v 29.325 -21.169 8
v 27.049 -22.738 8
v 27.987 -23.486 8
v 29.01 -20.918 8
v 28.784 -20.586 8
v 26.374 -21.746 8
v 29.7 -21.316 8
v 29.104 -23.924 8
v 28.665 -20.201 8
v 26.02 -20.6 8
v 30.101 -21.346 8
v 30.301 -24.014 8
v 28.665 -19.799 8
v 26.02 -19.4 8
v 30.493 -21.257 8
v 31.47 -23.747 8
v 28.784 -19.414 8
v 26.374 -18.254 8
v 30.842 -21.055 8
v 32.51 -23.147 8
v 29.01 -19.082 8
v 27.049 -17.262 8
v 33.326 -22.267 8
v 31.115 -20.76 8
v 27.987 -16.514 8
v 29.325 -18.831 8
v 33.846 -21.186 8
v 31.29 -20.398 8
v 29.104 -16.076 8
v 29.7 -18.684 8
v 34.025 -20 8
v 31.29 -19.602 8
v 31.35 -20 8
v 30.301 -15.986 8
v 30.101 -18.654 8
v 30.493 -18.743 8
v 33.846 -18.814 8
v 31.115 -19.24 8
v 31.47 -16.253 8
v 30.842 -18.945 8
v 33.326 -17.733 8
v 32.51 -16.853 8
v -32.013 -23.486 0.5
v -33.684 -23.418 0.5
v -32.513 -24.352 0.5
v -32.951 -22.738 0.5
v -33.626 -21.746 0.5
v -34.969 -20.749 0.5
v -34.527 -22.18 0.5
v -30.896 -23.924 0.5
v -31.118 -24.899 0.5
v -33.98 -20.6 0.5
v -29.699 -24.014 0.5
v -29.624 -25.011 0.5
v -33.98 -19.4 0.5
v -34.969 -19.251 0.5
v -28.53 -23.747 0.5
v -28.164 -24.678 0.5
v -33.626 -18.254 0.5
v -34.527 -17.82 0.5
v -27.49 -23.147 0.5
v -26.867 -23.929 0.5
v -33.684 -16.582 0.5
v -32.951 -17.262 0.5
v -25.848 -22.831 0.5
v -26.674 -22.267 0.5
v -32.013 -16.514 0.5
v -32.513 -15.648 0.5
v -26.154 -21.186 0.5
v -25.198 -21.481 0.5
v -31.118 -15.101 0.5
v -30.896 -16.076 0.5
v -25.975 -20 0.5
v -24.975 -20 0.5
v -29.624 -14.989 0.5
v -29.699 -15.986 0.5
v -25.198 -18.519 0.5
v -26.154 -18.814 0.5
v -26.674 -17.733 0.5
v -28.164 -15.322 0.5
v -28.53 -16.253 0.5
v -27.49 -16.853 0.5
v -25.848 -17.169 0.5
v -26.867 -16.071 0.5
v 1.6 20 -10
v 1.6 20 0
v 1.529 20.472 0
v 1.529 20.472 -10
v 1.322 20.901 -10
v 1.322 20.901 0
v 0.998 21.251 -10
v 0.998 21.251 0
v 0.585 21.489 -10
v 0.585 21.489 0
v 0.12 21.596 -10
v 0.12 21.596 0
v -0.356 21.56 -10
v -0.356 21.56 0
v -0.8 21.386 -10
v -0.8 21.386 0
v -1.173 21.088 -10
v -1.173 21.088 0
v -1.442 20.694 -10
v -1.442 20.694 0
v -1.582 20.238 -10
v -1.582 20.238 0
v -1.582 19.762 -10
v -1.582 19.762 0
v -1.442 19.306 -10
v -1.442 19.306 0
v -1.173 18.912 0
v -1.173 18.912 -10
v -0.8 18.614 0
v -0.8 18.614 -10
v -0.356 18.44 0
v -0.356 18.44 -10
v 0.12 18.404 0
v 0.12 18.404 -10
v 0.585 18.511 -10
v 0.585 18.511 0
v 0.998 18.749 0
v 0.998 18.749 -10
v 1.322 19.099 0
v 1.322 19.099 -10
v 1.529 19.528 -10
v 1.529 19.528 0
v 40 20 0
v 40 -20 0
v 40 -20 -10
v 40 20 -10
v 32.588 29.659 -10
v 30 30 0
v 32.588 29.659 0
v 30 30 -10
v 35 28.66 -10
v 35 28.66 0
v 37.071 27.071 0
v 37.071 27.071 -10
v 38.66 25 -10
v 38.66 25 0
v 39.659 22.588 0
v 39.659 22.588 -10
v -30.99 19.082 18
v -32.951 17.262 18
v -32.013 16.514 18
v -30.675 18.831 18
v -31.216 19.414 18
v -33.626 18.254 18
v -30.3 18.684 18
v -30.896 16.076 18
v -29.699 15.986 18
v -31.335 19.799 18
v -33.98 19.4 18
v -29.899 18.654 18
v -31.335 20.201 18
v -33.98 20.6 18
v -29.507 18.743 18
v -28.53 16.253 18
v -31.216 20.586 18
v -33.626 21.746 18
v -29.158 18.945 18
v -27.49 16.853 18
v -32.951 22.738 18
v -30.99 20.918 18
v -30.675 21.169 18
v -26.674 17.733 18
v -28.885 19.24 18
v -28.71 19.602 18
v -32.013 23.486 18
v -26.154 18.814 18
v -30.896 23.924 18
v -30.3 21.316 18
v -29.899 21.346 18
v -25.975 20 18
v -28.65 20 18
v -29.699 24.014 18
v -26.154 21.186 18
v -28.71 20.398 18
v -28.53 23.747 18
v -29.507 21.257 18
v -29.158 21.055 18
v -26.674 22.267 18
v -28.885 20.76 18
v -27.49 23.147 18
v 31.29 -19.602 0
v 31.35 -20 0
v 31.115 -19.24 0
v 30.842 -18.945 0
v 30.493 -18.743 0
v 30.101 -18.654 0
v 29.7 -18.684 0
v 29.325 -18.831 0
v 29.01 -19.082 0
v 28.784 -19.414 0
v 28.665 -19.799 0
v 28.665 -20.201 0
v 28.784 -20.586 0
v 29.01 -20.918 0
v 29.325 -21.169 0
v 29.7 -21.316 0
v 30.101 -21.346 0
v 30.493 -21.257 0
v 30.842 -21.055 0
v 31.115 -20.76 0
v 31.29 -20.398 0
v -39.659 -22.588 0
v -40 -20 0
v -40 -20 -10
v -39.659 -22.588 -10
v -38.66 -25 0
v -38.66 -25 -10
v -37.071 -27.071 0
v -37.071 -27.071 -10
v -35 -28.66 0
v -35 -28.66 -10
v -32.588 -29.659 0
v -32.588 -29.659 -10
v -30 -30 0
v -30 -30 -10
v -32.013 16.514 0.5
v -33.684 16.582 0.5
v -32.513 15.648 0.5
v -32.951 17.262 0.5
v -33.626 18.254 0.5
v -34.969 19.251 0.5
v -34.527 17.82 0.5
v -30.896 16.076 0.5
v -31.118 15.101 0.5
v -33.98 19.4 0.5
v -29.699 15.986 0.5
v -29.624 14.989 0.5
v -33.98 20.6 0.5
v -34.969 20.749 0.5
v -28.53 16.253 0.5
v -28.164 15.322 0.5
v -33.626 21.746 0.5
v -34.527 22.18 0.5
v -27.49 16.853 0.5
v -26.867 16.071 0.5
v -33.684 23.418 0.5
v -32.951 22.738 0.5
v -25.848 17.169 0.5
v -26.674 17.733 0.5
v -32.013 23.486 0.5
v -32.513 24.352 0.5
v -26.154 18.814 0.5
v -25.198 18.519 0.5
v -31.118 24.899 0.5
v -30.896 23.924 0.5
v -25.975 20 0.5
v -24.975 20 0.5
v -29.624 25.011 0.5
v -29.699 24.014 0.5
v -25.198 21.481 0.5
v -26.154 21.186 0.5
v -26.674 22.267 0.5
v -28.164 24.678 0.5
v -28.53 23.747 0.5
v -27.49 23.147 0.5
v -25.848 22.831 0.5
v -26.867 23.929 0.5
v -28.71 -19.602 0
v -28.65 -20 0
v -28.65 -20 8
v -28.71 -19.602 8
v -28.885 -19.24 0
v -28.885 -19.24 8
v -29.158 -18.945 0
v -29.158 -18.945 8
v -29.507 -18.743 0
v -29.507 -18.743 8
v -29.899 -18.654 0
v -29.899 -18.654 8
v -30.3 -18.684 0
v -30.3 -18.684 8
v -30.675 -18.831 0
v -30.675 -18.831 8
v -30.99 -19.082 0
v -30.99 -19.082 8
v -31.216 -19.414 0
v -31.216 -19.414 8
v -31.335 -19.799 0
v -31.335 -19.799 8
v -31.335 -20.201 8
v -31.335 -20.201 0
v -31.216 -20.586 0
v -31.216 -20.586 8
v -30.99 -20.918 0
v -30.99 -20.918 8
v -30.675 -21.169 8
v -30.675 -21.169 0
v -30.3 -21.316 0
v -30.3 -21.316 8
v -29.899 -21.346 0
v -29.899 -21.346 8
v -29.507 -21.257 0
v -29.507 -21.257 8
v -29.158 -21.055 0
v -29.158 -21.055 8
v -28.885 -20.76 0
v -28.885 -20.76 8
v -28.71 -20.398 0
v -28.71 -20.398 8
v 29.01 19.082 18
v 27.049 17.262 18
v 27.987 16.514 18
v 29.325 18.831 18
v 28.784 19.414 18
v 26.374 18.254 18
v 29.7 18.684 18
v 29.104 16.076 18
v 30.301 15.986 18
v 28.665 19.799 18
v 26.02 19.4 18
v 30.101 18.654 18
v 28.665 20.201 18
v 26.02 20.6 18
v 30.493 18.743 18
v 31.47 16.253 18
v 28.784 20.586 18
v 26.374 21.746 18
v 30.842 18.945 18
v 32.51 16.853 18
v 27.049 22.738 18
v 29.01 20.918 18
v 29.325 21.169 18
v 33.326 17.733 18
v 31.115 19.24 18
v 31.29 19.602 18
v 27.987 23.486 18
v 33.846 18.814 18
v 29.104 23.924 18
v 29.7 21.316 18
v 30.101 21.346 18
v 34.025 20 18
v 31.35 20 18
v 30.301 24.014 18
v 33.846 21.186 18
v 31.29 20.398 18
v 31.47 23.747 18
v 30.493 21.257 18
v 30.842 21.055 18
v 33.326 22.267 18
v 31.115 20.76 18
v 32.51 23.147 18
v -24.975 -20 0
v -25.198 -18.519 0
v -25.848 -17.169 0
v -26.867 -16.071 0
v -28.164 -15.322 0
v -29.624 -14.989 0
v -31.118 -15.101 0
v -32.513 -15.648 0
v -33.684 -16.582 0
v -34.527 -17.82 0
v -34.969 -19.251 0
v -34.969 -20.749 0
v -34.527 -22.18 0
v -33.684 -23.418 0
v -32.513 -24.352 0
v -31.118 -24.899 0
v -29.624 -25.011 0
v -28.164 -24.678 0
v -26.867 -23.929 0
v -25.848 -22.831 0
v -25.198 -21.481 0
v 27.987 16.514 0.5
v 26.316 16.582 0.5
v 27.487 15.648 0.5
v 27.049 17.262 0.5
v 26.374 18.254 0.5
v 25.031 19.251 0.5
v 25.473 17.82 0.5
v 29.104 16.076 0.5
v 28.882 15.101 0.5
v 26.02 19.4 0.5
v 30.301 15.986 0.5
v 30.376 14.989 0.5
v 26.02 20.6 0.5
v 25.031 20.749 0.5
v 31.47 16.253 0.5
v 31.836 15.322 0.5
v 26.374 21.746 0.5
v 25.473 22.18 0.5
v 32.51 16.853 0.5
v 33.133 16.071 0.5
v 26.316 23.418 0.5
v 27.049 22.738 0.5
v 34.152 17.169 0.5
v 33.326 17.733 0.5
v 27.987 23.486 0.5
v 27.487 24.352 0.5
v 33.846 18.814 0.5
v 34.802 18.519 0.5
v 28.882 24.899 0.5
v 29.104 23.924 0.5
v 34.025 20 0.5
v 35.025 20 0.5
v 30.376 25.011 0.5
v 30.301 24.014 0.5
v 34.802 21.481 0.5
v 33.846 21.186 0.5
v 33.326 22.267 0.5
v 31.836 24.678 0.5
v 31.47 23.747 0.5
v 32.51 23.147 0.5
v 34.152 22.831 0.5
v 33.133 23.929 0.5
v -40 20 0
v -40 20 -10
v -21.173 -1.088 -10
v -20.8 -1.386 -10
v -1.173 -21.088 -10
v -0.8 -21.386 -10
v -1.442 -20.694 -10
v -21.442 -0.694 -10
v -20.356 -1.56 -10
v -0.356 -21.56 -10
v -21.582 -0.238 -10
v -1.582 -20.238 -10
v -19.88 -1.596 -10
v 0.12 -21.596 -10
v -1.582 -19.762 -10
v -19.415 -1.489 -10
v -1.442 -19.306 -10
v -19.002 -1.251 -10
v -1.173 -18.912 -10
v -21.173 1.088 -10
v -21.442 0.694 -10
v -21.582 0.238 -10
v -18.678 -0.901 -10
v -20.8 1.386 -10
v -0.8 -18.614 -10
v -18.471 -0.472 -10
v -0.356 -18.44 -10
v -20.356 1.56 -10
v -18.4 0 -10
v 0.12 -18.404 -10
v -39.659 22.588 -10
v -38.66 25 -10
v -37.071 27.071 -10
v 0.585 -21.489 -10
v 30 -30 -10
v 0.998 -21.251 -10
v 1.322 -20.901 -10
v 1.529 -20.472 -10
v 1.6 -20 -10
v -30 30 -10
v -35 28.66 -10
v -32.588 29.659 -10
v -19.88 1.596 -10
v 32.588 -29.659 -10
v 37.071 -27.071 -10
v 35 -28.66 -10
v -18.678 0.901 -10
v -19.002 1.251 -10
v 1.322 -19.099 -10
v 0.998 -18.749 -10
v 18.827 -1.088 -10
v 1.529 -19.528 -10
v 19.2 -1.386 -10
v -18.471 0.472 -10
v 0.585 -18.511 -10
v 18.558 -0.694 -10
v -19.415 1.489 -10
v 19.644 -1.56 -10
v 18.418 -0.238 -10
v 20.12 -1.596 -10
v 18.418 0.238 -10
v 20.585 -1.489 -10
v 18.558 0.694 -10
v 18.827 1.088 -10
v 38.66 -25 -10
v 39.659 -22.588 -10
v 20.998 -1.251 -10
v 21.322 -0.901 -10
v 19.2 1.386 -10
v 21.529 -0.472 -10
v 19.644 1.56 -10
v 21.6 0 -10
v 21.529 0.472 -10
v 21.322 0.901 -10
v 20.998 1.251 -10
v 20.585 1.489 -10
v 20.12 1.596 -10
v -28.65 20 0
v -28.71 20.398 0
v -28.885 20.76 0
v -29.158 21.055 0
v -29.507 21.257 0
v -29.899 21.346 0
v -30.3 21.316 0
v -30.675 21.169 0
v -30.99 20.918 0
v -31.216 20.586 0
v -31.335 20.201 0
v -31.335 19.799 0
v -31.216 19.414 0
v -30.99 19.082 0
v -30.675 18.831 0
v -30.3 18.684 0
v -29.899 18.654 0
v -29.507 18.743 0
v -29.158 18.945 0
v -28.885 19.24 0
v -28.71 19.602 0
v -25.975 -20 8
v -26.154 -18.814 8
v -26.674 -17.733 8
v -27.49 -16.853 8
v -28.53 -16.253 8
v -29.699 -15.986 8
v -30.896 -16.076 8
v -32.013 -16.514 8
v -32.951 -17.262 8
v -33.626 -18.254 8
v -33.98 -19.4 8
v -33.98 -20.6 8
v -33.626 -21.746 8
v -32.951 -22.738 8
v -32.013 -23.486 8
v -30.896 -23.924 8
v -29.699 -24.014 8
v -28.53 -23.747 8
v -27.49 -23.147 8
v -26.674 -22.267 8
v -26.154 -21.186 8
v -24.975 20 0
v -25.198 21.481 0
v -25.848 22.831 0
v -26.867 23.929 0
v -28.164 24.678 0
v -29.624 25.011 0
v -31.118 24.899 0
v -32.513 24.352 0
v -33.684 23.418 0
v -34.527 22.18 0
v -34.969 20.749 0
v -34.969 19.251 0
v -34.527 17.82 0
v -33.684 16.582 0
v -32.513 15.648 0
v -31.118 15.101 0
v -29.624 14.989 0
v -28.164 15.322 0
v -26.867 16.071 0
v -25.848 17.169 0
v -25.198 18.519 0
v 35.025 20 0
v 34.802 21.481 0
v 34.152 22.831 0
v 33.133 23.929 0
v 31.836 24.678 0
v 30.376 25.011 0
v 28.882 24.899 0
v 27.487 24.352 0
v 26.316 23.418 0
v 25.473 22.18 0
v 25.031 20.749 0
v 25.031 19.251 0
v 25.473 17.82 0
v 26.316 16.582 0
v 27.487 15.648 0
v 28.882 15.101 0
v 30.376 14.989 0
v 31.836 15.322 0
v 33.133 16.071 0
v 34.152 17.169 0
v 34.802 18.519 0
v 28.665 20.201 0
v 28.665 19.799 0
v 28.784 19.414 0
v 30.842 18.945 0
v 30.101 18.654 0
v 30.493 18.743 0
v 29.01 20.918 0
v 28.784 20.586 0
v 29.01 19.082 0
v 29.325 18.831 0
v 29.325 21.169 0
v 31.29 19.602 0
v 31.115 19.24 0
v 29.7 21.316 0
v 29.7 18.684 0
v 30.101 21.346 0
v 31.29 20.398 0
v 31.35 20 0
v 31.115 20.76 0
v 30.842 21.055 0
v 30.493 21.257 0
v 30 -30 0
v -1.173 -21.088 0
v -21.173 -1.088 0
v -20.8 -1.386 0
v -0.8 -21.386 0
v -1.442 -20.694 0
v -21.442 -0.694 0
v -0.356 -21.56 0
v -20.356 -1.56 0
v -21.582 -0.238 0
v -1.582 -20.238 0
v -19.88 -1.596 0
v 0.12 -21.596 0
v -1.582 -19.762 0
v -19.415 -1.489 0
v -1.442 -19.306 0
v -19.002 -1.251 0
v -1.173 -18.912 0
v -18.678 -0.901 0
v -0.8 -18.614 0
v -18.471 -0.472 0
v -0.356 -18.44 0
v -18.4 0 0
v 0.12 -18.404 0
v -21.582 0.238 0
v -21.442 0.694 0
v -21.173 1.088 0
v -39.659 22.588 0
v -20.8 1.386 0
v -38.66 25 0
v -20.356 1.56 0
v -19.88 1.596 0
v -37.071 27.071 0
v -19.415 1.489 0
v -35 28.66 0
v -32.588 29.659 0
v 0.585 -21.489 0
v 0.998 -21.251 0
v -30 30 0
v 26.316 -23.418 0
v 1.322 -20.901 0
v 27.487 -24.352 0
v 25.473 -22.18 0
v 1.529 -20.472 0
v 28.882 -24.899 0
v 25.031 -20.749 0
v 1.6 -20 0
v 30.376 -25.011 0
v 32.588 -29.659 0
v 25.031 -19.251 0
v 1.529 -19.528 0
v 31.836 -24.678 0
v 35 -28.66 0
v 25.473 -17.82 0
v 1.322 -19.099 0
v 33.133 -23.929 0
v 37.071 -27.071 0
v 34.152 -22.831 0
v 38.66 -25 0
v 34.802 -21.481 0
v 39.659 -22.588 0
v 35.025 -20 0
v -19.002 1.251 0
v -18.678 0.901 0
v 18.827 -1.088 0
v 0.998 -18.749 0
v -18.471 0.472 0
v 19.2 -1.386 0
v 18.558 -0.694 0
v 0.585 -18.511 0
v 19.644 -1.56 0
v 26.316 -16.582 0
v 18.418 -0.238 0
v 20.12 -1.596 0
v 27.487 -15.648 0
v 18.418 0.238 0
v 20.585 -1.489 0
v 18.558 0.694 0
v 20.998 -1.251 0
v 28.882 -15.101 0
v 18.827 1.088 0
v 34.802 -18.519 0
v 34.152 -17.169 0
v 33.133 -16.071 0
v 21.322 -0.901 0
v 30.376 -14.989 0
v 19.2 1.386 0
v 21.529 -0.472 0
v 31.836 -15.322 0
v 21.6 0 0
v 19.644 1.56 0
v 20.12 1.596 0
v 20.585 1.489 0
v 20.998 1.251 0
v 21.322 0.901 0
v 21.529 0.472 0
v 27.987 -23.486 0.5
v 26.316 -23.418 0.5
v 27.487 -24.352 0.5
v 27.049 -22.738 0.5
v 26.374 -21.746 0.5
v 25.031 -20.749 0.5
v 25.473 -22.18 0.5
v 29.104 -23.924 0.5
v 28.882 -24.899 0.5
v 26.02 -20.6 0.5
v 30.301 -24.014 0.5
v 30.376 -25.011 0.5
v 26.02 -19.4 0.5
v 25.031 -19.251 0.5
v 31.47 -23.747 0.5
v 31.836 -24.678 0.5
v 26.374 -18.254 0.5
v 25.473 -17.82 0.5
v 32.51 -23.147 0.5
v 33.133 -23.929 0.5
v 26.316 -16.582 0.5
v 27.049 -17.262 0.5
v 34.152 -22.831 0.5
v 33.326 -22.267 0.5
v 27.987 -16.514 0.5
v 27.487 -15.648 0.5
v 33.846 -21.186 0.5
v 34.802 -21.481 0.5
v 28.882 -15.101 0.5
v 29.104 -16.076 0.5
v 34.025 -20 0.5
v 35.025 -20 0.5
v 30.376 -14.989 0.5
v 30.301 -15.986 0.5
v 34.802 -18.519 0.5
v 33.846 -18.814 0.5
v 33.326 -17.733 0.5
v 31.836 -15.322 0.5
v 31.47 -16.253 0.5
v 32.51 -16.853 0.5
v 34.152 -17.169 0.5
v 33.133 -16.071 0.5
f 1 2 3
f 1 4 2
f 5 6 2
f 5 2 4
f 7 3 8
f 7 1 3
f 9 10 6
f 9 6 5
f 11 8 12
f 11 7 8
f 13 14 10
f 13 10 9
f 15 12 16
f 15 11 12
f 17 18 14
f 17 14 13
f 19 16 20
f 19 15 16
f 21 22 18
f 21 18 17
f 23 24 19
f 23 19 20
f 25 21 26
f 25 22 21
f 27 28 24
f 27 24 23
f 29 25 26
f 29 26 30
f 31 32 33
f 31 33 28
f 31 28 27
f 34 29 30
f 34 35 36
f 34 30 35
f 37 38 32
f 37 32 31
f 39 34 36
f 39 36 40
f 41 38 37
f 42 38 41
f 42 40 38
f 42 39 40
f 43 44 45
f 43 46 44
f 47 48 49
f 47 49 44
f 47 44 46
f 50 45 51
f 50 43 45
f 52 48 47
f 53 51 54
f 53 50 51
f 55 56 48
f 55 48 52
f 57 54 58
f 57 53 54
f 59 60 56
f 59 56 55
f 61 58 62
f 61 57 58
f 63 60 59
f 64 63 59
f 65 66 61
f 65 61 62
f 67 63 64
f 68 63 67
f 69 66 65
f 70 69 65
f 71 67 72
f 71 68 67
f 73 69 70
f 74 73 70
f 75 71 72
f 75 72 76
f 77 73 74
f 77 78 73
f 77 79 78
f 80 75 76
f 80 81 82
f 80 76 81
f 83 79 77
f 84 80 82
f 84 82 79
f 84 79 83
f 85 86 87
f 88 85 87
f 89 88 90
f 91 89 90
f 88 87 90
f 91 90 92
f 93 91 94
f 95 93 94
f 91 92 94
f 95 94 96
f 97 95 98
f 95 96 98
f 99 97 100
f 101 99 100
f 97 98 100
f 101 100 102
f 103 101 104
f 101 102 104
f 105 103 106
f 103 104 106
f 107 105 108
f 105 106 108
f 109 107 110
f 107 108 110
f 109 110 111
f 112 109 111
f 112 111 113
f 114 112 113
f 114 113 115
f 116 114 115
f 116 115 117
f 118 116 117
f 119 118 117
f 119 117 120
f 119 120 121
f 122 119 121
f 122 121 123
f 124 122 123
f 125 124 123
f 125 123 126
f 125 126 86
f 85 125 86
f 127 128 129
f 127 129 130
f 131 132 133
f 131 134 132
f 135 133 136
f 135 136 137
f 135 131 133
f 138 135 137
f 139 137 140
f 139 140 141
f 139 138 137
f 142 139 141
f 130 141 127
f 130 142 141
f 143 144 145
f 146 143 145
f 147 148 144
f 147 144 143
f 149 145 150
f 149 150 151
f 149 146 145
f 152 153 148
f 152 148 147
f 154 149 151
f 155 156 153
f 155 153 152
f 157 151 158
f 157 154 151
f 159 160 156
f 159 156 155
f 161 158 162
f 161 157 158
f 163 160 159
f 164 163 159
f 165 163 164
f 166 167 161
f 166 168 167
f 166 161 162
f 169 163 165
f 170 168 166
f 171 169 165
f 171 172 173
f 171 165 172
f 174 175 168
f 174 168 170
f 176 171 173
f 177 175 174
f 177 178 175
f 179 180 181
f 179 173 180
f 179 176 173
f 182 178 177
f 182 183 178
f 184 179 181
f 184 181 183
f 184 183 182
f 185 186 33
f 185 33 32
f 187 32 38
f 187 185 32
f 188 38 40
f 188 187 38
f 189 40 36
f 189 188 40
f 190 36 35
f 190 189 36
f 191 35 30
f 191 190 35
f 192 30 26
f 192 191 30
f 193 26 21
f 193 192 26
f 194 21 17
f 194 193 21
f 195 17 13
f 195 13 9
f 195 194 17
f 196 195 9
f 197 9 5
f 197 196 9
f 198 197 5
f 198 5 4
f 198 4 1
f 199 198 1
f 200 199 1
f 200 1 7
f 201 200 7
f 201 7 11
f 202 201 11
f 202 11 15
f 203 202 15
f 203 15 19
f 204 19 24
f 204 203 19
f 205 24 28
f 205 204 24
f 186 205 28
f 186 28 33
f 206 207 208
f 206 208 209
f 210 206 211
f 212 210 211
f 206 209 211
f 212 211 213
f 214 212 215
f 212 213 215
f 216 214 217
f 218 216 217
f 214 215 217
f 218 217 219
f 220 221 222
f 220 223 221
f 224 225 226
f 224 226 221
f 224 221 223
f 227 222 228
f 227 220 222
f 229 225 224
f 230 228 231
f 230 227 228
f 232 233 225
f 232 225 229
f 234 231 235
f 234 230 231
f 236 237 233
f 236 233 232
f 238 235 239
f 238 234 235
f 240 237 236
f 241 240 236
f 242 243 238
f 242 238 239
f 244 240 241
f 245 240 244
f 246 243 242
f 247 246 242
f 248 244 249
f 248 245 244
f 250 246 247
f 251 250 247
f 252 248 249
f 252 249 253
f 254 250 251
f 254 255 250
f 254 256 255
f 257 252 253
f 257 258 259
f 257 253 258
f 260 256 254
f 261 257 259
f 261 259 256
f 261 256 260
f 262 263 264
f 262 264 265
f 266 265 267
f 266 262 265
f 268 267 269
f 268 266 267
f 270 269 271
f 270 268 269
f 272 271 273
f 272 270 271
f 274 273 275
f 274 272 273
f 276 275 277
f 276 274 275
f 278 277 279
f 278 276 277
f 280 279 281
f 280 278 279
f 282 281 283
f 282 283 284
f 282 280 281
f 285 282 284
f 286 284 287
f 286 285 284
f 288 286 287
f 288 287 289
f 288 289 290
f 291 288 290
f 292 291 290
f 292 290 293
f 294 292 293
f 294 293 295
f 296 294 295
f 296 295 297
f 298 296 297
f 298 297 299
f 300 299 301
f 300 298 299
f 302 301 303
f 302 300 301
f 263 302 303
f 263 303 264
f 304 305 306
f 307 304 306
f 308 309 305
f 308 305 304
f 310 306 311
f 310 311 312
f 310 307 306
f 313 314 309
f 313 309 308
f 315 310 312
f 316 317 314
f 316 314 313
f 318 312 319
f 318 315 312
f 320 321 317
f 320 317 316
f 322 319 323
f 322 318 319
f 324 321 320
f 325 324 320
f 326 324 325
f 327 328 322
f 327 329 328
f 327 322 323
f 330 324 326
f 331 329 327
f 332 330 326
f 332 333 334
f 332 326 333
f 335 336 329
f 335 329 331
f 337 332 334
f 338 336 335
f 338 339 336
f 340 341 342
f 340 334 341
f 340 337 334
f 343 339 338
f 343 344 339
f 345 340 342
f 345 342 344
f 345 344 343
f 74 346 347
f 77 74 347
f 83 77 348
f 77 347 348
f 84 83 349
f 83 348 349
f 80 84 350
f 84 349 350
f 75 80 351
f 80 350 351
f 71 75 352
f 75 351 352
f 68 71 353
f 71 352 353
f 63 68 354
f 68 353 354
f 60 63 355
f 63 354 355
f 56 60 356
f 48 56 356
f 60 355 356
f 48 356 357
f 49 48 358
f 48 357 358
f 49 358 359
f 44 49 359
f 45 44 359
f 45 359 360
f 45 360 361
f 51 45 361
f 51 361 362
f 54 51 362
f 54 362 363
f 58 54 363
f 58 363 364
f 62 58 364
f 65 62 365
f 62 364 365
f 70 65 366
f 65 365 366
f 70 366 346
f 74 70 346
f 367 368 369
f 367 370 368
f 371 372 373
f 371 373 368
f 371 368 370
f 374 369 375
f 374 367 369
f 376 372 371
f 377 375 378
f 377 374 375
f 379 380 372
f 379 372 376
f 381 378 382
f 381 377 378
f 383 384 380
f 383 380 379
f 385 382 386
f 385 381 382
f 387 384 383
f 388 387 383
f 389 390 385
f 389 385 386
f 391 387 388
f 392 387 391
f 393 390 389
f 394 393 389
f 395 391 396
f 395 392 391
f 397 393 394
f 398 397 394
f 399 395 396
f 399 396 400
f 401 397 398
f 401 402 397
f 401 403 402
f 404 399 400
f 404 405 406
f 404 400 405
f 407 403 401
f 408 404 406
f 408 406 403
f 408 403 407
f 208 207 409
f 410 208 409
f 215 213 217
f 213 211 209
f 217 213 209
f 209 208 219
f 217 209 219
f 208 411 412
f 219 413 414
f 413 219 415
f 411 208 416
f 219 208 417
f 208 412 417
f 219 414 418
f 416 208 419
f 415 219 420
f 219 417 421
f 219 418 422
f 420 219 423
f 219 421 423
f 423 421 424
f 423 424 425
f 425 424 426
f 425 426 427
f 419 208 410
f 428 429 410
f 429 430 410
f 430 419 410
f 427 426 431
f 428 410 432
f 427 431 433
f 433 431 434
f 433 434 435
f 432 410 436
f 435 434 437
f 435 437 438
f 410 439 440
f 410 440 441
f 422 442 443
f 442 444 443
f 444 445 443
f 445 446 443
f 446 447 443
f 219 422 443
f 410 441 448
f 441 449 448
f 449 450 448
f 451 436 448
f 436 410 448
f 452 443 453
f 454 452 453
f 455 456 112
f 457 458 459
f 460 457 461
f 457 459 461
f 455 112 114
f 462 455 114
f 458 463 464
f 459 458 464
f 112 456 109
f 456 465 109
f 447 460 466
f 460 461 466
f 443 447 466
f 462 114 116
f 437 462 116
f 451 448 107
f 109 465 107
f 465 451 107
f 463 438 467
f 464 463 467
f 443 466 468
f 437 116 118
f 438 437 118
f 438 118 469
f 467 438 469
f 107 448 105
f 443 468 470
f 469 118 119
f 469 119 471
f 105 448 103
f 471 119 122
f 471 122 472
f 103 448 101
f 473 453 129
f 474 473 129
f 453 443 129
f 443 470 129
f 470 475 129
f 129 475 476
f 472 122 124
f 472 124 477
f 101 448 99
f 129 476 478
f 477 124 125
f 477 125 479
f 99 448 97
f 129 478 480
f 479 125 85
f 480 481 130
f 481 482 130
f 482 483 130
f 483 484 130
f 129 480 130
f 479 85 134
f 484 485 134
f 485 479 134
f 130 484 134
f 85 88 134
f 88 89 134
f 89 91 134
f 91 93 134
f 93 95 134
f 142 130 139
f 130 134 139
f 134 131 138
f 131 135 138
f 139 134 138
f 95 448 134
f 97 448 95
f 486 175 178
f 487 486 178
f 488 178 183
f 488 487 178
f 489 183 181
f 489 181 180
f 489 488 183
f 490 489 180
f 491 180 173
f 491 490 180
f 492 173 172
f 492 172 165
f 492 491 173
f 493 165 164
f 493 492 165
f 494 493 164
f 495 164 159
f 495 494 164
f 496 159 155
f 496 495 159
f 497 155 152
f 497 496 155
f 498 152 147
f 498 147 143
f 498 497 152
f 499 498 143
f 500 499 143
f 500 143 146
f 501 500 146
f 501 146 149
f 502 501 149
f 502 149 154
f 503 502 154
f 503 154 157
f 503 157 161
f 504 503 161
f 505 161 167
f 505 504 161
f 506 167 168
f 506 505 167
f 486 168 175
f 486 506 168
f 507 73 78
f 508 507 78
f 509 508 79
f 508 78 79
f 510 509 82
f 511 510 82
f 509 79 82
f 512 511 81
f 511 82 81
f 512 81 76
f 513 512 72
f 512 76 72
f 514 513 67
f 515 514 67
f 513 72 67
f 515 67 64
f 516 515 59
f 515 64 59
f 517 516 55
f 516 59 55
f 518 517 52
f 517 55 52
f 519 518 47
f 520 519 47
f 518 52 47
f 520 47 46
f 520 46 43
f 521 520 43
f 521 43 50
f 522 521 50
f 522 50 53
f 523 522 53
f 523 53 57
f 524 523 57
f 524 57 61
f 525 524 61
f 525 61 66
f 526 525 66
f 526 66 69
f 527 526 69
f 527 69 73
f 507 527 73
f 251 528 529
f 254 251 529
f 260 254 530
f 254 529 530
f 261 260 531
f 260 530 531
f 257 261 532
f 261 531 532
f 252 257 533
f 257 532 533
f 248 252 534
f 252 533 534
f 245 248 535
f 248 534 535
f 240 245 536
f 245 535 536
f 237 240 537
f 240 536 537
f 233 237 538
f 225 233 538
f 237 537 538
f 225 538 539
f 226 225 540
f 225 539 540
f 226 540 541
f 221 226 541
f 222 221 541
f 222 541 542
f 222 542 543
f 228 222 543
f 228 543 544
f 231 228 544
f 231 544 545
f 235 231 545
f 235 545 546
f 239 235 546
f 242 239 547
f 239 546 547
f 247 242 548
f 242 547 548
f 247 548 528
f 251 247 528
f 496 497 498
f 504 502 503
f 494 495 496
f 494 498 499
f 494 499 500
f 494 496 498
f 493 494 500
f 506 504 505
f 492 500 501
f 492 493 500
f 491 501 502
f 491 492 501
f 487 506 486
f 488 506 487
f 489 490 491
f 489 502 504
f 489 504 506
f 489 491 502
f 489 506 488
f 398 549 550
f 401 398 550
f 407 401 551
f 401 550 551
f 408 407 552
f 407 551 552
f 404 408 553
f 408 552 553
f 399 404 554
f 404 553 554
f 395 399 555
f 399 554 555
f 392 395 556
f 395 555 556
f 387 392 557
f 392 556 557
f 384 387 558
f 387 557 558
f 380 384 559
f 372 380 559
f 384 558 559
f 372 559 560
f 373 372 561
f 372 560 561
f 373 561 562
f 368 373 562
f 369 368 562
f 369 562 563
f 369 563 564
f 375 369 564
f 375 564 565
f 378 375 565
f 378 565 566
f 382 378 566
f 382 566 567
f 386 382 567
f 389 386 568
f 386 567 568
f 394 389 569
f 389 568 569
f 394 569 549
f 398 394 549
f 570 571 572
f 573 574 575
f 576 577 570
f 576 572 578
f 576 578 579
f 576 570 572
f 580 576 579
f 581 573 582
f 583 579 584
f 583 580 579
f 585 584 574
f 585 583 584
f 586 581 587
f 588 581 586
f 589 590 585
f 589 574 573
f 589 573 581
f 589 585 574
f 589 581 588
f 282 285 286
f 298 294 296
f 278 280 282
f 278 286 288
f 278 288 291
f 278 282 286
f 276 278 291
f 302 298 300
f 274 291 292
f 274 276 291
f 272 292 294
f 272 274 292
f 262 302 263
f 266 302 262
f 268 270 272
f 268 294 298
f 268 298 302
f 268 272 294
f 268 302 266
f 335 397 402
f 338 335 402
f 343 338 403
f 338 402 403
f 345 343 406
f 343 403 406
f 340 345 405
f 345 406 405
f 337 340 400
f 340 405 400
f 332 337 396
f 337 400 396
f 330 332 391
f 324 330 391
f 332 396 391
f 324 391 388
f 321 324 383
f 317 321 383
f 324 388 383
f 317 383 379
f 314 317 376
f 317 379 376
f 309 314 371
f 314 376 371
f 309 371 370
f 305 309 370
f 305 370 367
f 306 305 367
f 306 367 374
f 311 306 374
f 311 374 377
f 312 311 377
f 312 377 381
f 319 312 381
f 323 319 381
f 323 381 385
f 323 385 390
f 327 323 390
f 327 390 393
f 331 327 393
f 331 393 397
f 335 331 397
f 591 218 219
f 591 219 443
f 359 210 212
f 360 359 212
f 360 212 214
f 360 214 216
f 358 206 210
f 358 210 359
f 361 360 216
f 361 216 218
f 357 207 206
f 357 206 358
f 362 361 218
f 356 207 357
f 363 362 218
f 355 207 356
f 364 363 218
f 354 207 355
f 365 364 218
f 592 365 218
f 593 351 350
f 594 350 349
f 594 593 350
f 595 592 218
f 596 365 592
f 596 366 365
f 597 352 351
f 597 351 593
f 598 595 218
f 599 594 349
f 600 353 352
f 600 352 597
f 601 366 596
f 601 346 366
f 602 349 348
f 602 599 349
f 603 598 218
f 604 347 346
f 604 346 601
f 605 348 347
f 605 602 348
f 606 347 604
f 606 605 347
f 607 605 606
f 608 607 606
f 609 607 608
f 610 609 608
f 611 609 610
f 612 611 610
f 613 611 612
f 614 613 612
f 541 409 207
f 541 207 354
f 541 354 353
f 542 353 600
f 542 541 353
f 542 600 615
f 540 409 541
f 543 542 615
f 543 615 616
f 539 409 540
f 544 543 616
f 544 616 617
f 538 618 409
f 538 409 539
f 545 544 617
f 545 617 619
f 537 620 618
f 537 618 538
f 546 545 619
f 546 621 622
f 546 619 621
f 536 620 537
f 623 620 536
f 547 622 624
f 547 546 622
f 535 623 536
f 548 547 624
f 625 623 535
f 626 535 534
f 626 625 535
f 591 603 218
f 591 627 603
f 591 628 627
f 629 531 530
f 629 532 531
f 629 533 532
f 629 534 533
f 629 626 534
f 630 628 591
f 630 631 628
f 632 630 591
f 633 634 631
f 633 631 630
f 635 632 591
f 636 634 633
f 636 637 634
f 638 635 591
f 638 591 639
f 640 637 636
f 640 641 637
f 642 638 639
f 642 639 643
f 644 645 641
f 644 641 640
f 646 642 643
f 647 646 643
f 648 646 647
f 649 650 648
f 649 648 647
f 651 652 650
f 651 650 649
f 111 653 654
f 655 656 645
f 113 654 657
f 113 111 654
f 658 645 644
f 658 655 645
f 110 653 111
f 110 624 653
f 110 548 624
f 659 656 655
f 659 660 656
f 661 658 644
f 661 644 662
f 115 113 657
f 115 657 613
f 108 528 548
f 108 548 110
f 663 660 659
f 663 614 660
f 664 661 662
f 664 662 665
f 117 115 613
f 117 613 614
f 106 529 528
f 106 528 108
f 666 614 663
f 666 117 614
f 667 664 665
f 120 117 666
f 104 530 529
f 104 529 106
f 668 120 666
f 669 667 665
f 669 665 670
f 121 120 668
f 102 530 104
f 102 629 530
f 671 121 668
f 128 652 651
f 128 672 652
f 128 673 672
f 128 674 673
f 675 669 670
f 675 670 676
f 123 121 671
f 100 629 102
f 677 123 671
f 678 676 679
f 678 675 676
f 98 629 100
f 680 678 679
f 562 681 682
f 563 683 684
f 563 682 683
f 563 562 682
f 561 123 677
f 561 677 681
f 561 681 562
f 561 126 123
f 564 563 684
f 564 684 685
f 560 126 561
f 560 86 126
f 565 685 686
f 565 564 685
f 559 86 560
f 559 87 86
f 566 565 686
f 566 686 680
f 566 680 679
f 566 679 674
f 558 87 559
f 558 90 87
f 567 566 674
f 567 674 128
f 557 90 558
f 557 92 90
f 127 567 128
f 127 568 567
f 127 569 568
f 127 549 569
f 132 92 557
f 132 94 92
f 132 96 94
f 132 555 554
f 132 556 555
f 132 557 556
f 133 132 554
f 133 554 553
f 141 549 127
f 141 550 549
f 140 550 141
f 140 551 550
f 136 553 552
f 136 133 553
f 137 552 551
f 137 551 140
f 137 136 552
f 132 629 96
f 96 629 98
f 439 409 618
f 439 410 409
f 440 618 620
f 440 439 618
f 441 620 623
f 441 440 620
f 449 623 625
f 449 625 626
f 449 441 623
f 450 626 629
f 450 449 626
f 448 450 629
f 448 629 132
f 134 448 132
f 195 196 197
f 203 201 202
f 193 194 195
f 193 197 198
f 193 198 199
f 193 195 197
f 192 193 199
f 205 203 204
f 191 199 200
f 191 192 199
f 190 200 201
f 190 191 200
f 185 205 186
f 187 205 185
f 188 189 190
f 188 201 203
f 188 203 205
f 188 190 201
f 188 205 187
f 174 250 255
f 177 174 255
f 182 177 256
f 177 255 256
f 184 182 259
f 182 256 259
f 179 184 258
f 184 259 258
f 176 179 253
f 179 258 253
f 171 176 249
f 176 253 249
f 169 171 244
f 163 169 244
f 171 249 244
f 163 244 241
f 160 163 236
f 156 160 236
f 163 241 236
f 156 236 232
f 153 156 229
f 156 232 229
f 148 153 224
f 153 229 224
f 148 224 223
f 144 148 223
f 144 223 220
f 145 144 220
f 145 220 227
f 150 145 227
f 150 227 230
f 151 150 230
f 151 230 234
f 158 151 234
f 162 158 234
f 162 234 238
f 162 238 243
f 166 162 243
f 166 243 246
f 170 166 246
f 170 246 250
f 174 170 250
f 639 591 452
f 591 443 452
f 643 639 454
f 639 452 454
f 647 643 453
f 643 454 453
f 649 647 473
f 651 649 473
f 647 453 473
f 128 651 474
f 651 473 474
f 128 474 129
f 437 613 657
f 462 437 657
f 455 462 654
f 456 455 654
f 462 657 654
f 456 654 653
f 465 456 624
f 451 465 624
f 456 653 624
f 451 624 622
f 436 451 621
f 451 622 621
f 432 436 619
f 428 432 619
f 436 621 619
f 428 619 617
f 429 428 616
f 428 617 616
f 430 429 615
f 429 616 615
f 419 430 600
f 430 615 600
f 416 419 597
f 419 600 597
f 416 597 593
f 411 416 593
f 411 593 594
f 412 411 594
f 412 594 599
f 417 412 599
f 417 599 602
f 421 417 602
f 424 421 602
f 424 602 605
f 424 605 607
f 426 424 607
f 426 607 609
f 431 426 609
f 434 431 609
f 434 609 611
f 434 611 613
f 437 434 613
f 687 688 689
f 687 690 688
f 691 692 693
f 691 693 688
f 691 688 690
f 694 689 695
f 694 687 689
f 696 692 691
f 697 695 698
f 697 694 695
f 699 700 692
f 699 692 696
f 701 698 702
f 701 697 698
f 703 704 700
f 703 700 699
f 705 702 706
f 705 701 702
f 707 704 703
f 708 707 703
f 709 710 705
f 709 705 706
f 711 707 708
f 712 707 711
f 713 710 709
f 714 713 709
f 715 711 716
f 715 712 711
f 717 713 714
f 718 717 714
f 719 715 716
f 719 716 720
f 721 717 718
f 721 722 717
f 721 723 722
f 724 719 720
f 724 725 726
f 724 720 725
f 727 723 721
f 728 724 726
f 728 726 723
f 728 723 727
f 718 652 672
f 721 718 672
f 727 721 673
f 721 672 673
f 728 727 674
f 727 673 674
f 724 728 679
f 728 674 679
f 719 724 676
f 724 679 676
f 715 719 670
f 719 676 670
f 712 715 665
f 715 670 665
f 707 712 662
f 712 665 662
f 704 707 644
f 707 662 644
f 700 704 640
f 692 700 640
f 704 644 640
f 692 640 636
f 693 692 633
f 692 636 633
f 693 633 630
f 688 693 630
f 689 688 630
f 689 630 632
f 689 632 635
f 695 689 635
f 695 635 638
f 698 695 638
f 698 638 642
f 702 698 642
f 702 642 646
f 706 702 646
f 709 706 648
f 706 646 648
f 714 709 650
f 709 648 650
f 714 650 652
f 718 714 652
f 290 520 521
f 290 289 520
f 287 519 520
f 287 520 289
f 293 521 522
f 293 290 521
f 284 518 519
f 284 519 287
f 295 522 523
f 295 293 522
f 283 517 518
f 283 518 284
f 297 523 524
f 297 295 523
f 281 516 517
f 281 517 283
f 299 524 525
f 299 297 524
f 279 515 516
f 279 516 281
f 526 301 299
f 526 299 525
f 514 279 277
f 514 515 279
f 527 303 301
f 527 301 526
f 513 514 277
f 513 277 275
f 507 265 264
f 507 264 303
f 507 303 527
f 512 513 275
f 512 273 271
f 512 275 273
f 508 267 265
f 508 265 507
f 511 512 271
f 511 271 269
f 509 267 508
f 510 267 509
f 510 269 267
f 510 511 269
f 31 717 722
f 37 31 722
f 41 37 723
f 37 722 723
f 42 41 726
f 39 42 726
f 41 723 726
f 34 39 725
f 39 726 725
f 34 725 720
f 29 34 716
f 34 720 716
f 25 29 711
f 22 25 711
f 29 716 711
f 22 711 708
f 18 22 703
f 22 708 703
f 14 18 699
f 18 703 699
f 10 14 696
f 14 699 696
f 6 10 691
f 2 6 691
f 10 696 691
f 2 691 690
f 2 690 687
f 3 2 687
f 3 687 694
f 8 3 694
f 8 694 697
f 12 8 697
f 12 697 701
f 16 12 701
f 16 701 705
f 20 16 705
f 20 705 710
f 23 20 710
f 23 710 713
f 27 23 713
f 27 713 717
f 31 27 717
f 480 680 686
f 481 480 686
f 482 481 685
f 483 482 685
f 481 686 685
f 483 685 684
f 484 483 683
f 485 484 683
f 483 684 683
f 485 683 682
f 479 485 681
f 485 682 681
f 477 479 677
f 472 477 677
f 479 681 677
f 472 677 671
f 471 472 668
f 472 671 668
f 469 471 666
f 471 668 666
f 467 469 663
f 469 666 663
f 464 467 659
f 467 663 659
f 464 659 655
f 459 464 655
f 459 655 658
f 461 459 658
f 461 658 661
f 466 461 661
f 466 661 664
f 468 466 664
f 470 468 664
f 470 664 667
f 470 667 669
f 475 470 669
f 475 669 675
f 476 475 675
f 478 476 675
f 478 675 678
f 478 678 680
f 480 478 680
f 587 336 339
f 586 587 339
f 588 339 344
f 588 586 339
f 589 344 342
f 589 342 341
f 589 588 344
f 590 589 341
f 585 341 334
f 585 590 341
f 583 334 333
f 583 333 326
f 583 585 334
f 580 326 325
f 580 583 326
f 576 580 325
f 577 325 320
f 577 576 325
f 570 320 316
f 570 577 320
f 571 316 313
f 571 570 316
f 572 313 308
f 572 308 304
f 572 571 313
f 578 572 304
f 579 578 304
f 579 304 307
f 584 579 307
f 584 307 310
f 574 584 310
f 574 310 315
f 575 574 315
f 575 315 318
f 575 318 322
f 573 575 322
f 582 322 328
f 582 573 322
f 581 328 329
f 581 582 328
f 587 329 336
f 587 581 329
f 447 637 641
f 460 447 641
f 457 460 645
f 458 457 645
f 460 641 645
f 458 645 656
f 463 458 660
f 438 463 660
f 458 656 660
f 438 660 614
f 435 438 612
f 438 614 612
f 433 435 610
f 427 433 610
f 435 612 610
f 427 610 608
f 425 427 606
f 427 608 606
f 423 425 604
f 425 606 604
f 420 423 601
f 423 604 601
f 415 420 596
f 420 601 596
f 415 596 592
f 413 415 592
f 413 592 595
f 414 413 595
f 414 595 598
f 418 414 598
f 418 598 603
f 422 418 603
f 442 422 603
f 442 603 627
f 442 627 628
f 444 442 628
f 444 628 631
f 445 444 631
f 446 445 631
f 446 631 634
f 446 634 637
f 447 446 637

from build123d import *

# Parameters (mm, degrees)
SKETCH1_W               = 80
SKETCH1_H               = 60
BOSS_EXTRUDE1_DEPTH     = 10
SKETCH1_3_R             = 4.025
SKETCH1_3_R_2           = 1.35
BOSS_EXTRUDE2_DEPTH     = 8
SKETCH1_5_R             = 4.025
SKETCH1_5_R_2           = 1.35
BOSS_EXTRUDE4_DEPTH     = 18
SKETCH1_4_R             = 5.025
SKETCH1_4_R_2           = 4.025
BOSS_EXTRUDE3_DEPTH     = 0.5
SKETCH1_6_R             = 1.6
CUT_EXTRUDE1_DEPTH      = 19
CUT_EXTRUDE1_DEPTH_BACK = 11
FILLET1_R               = 10


with BuildPart() as part:
    # Sketch1 → Boss-Extrude1 (new body)
    with BuildSketch(Plane.XY):
        Rectangle(SKETCH1_W, SKETCH1_H)
    extrude(amount=-BOSS_EXTRUDE1_DEPTH)

    # Sketch1<3> → Boss-Extrude2 (add)
    with BuildSketch(Plane.XY):
        with Locations((-30, -20)):
            Circle(SKETCH1_3_R)
        with Locations((-30, -20)):
            Circle(SKETCH1_3_R_2, mode=Mode.SUBTRACT)
        with Locations((30, -20)):
            Circle(SKETCH1_3_R)
        with Locations((30, -20)):
            Circle(SKETCH1_3_R_2, mode=Mode.SUBTRACT)
    extrude(amount=BOSS_EXTRUDE2_DEPTH)

    # Sketch1<5> → Boss-Extrude4 (add)
    with BuildSketch(Plane.XY):
        with Locations((-30, 20)):
            Circle(SKETCH1_5_R)
        with Locations((-30, 20)):
            Circle(SKETCH1_5_R_2, mode=Mode.SUBTRACT)
        with Locations((30, 20)):
            Circle(SKETCH1_5_R)
        with Locations((30, 20)):
            Circle(SKETCH1_5_R_2, mode=Mode.SUBTRACT)
    extrude(amount=BOSS_EXTRUDE4_DEPTH)

    # Sketch1<4> → Boss-Extrude3 (add)
    with BuildSketch(Plane.XY):
        with Locations((-30, 20)):
            Circle(SKETCH1_4_R)
        with Locations((-30, 20)):
            Circle(SKETCH1_4_R_2, mode=Mode.SUBTRACT)
        with Locations((30, 20)):
            Circle(SKETCH1_4_R)
        with Locations((30, 20)):
            Circle(SKETCH1_4_R_2, mode=Mode.SUBTRACT)
        with Locations((30, -20)):
            Circle(SKETCH1_4_R)
        with Locations((30, -20)):
            Circle(SKETCH1_4_R_2, mode=Mode.SUBTRACT)
        with Locations((-30, -20)):
            Circle(SKETCH1_4_R)
        with Locations((-30, -20)):
            Circle(SKETCH1_4_R_2, mode=Mode.SUBTRACT)
    extrude(amount=BOSS_EXTRUDE3_DEPTH)

    # Sketch1<6> → Cut-Extrude1 (cut, two sides)
    with BuildSketch(Plane.XY) as cut_extrude1_sk:
        with Locations((0, 20)):
            Circle(SKETCH1_6_R)
        with Locations((-20, 0)):
            Circle(SKETCH1_6_R)
        with Locations((0, -20)):
            Circle(SKETCH1_6_R)
        with Locations((20, 0)):
            Circle(SKETCH1_6_R)
    extrude(amount=CUT_EXTRUDE1_DEPTH, mode=Mode.SUBTRACT)
    extrude(cut_extrude1_sk.sketch, amount=-CUT_EXTRUDE1_DEPTH_BACK, mode=Mode.SUBTRACT)

    # Fillet1
    fillet1_edges = [part.edges().sort_by_distance(p)[0] for p in [
        (-40, 30, -5),
        (-40, -30, -5),
        (40, -30, -5),
        (40, 30, -5),
    ]]
    fillet(fillet1_edges, radius=FILLET1_R)


solid = part.part
